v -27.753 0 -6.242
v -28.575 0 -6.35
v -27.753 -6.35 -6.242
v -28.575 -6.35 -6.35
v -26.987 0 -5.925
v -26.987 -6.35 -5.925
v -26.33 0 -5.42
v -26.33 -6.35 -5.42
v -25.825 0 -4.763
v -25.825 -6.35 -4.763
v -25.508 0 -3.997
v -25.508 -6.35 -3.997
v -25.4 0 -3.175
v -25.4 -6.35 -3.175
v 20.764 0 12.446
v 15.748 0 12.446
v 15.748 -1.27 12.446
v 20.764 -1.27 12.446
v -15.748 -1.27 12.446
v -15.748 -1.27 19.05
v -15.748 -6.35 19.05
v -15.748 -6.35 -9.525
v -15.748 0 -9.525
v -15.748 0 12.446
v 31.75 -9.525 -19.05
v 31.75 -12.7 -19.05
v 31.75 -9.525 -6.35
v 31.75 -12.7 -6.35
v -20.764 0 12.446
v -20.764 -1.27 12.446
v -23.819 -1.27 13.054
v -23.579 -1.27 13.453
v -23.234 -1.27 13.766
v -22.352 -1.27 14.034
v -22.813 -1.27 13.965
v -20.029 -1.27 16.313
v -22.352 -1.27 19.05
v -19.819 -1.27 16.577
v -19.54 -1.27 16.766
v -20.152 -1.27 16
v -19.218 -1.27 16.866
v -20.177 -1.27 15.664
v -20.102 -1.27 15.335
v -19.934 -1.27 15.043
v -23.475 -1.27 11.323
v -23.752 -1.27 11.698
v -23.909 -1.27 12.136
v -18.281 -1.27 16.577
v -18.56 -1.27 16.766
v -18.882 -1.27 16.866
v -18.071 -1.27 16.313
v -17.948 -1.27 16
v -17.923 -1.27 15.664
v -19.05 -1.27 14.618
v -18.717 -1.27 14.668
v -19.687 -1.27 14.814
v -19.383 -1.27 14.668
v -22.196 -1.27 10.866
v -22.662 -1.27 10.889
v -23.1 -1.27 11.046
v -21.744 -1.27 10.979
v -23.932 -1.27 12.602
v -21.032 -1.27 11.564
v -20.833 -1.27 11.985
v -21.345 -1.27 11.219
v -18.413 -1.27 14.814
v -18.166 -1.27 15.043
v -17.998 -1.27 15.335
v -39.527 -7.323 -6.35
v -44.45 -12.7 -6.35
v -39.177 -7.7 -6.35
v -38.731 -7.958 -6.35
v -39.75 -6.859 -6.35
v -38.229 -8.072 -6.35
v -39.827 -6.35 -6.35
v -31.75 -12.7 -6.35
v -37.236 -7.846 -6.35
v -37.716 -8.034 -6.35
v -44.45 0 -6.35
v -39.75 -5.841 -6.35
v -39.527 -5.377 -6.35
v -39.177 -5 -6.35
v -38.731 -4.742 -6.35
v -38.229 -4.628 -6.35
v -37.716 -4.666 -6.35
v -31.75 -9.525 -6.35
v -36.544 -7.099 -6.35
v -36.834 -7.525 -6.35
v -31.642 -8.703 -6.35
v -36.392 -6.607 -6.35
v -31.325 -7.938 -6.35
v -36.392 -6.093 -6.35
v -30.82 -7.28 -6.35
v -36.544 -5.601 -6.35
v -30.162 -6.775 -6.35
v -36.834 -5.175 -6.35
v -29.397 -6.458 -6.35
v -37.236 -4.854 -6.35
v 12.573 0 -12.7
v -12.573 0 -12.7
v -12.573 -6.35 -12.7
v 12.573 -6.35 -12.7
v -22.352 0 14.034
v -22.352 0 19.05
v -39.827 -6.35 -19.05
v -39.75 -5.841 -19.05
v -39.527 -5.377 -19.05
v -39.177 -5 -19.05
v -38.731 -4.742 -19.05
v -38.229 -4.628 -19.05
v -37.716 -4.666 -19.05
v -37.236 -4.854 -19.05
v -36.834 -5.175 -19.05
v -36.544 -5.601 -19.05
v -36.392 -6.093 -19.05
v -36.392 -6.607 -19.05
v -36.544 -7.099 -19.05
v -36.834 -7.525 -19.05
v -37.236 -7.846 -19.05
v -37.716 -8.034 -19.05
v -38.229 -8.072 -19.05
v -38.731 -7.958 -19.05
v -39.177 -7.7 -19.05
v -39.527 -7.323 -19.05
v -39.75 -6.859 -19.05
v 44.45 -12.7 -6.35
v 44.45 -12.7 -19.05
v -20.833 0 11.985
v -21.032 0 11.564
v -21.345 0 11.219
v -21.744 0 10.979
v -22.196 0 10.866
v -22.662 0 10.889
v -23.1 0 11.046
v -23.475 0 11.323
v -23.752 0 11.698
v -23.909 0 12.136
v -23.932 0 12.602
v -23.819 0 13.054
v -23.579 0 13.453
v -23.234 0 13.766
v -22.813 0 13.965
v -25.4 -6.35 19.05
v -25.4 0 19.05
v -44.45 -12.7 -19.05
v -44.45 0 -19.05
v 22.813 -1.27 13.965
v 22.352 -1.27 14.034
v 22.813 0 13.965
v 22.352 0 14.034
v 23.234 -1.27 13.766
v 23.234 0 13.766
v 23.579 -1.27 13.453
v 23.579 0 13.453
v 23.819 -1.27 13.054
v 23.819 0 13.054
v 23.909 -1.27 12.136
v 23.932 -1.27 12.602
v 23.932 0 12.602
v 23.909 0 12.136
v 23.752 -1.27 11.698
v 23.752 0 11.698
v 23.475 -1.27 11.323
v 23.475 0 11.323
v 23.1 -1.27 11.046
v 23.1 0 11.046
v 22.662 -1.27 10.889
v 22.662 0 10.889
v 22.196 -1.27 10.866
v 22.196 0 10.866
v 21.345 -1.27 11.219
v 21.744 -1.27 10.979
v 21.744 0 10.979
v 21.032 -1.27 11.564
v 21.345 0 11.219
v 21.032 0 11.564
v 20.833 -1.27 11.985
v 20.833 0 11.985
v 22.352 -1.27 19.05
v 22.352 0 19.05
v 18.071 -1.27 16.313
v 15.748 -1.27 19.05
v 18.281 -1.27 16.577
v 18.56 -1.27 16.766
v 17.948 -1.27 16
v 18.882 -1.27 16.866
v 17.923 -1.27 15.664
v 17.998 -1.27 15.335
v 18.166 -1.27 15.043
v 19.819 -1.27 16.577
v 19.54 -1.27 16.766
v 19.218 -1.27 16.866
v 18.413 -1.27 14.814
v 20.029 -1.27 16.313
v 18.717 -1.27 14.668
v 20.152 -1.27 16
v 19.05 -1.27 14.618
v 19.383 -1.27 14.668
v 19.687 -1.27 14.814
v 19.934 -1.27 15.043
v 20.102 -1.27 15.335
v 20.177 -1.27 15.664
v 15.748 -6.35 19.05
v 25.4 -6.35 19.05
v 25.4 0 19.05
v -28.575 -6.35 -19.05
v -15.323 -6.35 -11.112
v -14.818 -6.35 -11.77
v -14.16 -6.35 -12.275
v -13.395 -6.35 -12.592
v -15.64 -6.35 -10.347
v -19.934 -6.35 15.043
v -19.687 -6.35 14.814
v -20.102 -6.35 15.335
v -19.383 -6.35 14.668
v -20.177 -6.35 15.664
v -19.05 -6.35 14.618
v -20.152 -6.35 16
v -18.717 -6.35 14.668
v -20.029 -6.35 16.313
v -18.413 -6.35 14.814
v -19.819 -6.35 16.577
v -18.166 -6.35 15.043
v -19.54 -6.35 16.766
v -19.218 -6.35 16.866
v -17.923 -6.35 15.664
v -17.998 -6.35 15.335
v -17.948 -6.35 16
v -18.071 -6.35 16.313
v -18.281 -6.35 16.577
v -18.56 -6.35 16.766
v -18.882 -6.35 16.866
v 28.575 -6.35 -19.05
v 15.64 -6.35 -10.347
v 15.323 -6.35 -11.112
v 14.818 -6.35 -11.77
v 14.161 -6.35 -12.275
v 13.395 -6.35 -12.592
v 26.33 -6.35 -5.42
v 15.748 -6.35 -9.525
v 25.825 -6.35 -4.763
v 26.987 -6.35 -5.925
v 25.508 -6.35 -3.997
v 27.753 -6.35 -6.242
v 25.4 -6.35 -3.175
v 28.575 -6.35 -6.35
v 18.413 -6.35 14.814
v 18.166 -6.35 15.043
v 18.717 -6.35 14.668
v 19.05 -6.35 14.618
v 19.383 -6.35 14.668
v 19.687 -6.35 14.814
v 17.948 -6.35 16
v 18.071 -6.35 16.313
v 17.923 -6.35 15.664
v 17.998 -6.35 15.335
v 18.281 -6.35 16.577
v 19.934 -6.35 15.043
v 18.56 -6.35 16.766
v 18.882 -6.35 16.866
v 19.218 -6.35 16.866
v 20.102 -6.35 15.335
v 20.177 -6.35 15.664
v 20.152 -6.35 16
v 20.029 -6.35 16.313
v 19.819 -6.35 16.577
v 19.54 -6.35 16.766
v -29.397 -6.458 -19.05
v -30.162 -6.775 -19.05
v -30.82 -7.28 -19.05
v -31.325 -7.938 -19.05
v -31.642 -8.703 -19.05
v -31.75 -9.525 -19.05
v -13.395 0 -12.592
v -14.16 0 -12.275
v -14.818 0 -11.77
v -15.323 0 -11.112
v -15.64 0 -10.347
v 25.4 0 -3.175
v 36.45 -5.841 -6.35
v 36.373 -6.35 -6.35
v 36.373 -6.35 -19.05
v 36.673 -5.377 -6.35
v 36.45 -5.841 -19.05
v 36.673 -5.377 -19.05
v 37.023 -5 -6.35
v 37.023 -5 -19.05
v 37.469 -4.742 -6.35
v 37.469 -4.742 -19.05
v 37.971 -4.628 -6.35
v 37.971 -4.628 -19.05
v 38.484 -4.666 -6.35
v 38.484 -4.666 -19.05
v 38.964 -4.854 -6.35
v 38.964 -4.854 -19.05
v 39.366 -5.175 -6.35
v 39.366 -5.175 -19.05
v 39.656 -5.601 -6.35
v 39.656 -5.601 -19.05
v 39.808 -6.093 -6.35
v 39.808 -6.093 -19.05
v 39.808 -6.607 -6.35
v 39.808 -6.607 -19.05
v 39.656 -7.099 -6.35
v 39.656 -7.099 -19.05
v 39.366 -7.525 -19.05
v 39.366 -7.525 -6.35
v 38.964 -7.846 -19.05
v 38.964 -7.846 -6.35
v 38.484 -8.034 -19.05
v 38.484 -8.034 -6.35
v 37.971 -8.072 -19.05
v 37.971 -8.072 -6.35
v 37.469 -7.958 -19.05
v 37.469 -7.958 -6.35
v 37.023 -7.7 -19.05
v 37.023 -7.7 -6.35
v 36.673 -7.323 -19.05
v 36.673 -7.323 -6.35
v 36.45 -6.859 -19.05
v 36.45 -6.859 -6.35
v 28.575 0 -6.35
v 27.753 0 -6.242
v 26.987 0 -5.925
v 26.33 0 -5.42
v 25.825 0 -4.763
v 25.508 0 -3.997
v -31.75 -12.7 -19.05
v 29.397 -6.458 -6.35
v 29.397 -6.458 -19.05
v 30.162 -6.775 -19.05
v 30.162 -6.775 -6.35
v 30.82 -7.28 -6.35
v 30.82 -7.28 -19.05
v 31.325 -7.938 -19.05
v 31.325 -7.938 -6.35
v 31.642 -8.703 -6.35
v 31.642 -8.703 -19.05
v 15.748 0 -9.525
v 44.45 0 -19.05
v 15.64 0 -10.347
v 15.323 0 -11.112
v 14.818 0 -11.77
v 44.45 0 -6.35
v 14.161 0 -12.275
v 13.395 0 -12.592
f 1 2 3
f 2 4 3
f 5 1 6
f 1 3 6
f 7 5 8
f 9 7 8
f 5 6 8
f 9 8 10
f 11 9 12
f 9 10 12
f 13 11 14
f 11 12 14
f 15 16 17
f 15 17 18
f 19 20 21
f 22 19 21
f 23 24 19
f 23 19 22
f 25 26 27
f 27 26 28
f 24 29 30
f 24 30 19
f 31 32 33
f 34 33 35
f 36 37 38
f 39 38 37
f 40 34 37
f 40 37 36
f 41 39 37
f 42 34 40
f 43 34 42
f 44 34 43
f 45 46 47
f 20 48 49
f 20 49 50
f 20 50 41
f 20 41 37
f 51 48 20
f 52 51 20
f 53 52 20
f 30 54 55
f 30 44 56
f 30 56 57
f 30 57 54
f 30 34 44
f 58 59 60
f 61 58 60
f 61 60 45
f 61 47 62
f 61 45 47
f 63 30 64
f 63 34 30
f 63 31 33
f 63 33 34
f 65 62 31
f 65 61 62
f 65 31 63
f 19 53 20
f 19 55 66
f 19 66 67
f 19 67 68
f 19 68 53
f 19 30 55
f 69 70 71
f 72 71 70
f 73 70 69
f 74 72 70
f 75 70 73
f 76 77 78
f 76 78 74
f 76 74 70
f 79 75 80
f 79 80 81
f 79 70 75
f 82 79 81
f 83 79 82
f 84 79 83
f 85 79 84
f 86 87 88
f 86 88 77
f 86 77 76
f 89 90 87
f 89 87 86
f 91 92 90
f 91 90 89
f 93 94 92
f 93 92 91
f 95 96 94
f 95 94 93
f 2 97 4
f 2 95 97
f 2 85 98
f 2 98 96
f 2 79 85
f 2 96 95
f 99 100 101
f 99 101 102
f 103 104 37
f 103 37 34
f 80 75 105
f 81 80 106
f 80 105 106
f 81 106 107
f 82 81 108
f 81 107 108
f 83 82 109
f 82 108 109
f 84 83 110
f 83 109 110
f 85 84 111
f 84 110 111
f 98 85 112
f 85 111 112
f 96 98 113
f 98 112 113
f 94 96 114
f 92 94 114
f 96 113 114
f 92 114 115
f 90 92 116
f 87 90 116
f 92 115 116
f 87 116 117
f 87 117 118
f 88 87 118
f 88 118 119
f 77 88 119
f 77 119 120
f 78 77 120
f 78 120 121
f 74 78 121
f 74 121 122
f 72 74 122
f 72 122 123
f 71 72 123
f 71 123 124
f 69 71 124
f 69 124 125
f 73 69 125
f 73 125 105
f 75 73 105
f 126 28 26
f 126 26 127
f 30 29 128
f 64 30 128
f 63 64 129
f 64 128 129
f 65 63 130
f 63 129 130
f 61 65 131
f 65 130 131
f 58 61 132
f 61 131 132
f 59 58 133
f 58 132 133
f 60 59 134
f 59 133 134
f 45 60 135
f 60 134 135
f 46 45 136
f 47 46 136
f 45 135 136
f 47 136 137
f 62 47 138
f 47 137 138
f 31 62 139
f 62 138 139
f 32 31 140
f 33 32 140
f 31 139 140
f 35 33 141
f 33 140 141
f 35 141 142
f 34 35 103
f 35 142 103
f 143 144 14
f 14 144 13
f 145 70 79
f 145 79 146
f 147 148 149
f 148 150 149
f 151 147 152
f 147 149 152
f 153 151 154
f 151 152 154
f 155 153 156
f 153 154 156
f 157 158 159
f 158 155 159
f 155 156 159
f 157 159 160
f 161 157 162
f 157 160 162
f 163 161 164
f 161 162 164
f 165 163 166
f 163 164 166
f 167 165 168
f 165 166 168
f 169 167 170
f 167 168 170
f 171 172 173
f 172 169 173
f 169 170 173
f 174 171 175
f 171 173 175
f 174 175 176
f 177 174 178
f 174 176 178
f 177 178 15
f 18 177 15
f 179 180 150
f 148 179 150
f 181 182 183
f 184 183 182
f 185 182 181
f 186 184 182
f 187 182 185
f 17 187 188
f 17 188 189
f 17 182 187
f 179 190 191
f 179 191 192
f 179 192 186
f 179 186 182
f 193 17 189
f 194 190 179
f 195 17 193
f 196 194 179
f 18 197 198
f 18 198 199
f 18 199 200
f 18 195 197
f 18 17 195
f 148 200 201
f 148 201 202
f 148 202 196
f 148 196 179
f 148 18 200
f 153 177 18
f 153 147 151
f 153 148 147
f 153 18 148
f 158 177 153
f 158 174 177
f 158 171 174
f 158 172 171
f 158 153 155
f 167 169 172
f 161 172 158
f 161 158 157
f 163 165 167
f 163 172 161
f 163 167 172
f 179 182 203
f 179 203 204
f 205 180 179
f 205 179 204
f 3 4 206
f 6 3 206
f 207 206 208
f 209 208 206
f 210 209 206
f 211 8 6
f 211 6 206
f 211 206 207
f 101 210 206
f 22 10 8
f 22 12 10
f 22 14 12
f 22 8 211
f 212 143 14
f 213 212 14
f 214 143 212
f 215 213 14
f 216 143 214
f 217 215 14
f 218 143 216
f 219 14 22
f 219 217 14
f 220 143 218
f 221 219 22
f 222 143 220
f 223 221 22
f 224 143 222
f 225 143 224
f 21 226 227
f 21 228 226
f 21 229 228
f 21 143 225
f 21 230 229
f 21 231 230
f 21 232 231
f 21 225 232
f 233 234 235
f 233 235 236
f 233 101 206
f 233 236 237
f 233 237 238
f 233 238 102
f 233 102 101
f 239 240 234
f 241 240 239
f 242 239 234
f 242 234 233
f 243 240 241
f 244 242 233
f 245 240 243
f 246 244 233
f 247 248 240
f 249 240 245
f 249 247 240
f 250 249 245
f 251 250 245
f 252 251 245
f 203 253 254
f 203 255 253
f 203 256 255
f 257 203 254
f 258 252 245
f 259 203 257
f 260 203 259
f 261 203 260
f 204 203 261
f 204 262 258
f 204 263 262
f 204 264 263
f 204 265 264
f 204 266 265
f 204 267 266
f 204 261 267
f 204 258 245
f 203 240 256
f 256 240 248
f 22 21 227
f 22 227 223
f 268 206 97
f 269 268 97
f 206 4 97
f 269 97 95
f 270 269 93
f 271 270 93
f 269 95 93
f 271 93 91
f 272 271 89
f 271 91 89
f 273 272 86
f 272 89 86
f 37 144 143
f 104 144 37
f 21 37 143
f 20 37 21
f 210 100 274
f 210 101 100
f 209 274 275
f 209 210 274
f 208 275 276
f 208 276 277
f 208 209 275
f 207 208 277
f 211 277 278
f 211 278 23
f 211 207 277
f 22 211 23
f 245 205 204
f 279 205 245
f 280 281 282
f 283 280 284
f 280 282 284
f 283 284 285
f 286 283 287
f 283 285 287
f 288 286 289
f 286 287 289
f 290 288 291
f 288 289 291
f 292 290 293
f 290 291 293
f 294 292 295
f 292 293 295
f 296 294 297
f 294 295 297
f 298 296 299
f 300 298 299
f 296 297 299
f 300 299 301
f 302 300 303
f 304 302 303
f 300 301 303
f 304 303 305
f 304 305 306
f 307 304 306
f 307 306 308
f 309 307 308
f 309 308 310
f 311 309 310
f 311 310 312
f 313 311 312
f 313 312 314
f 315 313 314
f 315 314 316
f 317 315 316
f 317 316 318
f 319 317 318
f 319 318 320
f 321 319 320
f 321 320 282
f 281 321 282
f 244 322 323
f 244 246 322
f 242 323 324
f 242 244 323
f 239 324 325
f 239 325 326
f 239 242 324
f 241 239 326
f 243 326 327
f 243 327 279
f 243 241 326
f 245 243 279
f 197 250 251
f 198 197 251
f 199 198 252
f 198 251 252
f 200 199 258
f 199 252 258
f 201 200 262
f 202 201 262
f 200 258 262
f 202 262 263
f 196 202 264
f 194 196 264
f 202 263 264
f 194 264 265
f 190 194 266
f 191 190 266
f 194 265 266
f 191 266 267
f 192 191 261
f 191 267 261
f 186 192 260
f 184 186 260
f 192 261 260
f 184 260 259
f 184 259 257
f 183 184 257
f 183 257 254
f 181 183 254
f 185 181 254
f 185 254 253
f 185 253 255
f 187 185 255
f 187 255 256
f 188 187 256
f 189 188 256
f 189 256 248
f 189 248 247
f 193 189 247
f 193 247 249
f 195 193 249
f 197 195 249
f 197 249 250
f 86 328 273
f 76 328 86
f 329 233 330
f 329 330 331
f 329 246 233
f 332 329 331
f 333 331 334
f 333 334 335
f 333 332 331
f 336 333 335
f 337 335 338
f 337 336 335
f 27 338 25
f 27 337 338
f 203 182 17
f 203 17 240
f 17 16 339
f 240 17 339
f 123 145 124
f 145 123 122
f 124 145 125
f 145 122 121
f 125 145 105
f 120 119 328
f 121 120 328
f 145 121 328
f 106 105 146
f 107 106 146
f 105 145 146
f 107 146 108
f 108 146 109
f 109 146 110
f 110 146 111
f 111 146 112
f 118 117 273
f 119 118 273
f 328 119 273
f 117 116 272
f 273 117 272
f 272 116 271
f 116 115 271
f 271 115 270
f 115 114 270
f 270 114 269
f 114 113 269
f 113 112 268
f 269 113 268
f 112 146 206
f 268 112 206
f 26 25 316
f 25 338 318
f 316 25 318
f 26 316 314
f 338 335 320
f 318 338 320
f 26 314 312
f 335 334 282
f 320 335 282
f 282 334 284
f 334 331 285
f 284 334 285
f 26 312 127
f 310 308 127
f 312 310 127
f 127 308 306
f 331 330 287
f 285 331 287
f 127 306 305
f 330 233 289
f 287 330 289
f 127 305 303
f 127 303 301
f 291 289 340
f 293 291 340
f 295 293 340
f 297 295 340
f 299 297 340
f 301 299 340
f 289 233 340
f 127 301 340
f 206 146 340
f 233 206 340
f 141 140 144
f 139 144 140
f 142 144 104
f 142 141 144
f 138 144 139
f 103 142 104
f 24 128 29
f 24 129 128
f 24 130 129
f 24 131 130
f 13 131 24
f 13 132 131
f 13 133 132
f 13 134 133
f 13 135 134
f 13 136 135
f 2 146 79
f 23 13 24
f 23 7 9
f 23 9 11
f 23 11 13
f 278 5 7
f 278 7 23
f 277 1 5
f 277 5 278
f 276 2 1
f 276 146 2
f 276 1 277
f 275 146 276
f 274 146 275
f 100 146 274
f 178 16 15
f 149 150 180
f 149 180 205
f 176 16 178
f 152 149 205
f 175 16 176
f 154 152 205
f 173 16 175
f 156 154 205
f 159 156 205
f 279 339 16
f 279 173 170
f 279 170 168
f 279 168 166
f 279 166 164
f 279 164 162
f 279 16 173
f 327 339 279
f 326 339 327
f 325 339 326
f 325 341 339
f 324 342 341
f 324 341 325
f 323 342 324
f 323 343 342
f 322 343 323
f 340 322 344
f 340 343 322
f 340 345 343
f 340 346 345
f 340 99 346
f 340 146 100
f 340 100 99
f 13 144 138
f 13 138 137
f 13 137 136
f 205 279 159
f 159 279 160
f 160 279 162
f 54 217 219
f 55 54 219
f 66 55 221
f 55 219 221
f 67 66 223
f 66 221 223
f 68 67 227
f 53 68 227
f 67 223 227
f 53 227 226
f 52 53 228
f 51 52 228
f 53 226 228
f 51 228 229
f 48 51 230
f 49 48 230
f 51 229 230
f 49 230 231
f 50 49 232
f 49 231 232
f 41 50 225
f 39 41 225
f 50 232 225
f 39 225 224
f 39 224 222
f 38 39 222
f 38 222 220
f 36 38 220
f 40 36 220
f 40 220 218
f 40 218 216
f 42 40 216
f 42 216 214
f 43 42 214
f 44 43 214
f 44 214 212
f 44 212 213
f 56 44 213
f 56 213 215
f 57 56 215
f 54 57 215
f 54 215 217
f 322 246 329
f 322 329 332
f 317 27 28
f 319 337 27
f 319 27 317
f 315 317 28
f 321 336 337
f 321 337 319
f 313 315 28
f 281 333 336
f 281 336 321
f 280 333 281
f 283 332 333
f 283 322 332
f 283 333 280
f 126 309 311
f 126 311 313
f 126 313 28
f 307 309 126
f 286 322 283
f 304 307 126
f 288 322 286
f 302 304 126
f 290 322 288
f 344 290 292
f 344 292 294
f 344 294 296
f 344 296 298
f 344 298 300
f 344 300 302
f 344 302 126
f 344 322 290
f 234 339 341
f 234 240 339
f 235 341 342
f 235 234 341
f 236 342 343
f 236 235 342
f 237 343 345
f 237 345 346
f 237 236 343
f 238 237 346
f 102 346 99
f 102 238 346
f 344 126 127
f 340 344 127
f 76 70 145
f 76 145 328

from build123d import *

# Parameters (mm, degrees)
SKETCH1_W             = 88.9
SKETCH1_H             = 38.1
BOSS_EXTRUDE1_DEPTH   = 12.7
SKETCH2_W             = 19.05
SKETCH2_H             = 25.4
CUT_EXTRUDE2_DEPTH    = 50.99995
SKETCH5_W             = 31.496
SKETCH5_H             = 31.75
CUT_EXTRUDE3_DEPTH    = 50.99995
BOSS_EXTRUDE2_START   = -6.35
BOSS_EXTRUDE2_DEPTH   = 6.35
SKETCH7_W             = 6.604
SKETCH7_H             = 6.604
CUT_EXTRUDE4_DEPTH    = 1.27
F_4_40_TAPPED_HOLE2_D = 2.2606
F_8_32_TAPPED_HOLE1_D = 3.4544
SKETCH20_R            = 1.5875
CUT_EXTRUDE5_DEPTH    = 1.27
FILLET3_R             = 3.175
SKETCH21_W            = 6.35
SKETCH21_H            = 12.7
CUT_EXTRUDE6_DEPTH    = 6.35
FILLET4_R             = 3.175
FILLET5_R             = 3.175
FILLET6_R             = 3.175
FILLET7_R             = 3.175


# Read off the part's stored shape, not the designer's step: Boss-Extrude2
with BuildPart() as part:
    # Sketch1 → Boss-Extrude1 (new body)
    with BuildSketch(Plane(origin=(0, 0, 0), x_dir=(1, 0, 0), z_dir=(0, 1, 0))):
        Rectangle(SKETCH1_W, SKETCH1_H)
    extrude(amount=-BOSS_EXTRUDE1_DEPTH)

    # Sketch2 → Cut-Extrude2 (cut, through all)
    with BuildSketch(Plane(origin=(0, 0, 0), x_dir=(1, 0, 0), z_dir=(0, 1, 0))):
        with Locations((-34.925, -6.35)):
            Rectangle(SKETCH2_W, SKETCH2_H)
        with Locations((34.925, -6.35)):
            Rectangle(SKETCH2_W, SKETCH2_H)
    extrude(amount=-CUT_EXTRUDE2_DEPTH, mode=Mode.SUBTRACT)

    # Sketch5 → Cut-Extrude3 (cut, through all)
    with BuildSketch(Plane(origin=(0, 0, 0), x_dir=(1, 0, 0), z_dir=(0, 1, 0))):
        with Locations((0, -3.175)):
            Rectangle(SKETCH5_W, SKETCH5_H)
    extrude(amount=-CUT_EXTRUDE3_DEPTH, mode=Mode.SUBTRACT)

    # Boss-Extrude2 outline → Boss-Extrude2 (cut)
    with BuildSketch(Plane.XZ.offset(12.7).offset(BOSS_EXTRUDE2_START)):
        Polygon((-25.4, 19.05), (-25.4, -19.05), (25.4, -19.05), (25.4, 19.05), (15.748, 19.05), (15.748, -12.7), (-15.748, -12.7), (-15.748, 19.05), align=None)
    extrude(amount=BOSS_EXTRUDE2_DEPTH, mode=Mode.SUBTRACT)

    # Sketch7 → Cut-Extrude4 (cut)
    with BuildSketch(Plane(origin=(0, 0, 0), x_dir=(1, 0, 0), z_dir=(0, 1, 0))):
        with Locations((-19.05, -15.748)):
            Rectangle(SKETCH7_W, SKETCH7_H)
        with Locations((19.05, -15.748)):
            Rectangle(SKETCH7_W, SKETCH7_H)
    extrude(amount=-CUT_EXTRUDE4_DEPTH, mode=Mode.SUBTRACT)

    # #4-40 Tapped Hole2 (through all)
    with Locations(Plane(origin=(-19.05, -1.27, 15.748), x_dir=(0, 0, 1), z_dir=(0, 1, 0))):
        with Locations((0, 0), (0, 38.1)):
            Hole(F_4_40_TAPPED_HOLE2_D / 2)

    # #8-32 Tapped Hole1 (through all)
    with Locations(Plane(origin=(-38.1, -6.35, -6.35), x_dir=(1, 0, 0), z_dir=(0, 0, 1))):
        with Locations((0, 0), (76.2, 0)):
            Hole(F_8_32_TAPPED_HOLE1_D / 2)

    # Sketch20 → Cut-Extrude5 (cut)
    with BuildSketch(Plane(origin=(0, 0, 0), x_dir=(1, 0, 0), z_dir=(0, 1, 0))):
        with Locations((-22.352, -12.446)):
            Circle(SKETCH20_R)
        with Locations((22.352, -12.446)):
            Circle(SKETCH20_R)
    extrude(amount=-CUT_EXTRUDE5_DEPTH, mode=Mode.SUBTRACT)

    # Fillet3
    fillet3_edges = [part.edges().sort_by_distance(p)[0] for p in [
        (15.748, -3.175, -12.7),
        (-15.748, -3.175, -12.7),
    ]]
    fillet(fillet3_edges, radius=FILLET3_R)

    # Sketch21 → Cut-Extrude6 (cut)
    with BuildSketch(Plane.XZ.offset(12.7)):
        with Locations((-28.575, -12.7)):
            Rectangle(SKETCH21_W, SKETCH21_H)
        with Locations((28.575, -12.7)):
            Rectangle(SKETCH21_W, SKETCH21_H)
    extrude(amount=-CUT_EXTRUDE6_DEPTH, mode=Mode.SUBTRACT)

    # Fillet4
    fillet4_edges = [part.edges().sort_by_distance(p)[0] for p in [
        (-31.75, -6.35, -12.7),
    ]]
    fillet(fillet4_edges, radius=FILLET4_R)

    # Fillet5
    fillet5_edges = [part.edges().sort_by_distance(p)[0] for p in [
        (31.75, -6.35, -12.7),
    ]]
    fillet(fillet5_edges, radius=FILLET5_R)

    # Fillet6
    fillet6_edges = [part.edges().sort_by_distance(p)[0] for p in [
        (-25.4, -3.175, -6.35),
    ]]
    fillet(fillet6_edges, radius=FILLET6_R)

    # Fillet7
    fillet7_edges = [part.edges().sort_by_distance(p)[0] for p in [
        (25.4, -3.175, -6.35),
    ]]
    fillet(fillet7_edges, radius=FILLET7_R)


solid = part.part
